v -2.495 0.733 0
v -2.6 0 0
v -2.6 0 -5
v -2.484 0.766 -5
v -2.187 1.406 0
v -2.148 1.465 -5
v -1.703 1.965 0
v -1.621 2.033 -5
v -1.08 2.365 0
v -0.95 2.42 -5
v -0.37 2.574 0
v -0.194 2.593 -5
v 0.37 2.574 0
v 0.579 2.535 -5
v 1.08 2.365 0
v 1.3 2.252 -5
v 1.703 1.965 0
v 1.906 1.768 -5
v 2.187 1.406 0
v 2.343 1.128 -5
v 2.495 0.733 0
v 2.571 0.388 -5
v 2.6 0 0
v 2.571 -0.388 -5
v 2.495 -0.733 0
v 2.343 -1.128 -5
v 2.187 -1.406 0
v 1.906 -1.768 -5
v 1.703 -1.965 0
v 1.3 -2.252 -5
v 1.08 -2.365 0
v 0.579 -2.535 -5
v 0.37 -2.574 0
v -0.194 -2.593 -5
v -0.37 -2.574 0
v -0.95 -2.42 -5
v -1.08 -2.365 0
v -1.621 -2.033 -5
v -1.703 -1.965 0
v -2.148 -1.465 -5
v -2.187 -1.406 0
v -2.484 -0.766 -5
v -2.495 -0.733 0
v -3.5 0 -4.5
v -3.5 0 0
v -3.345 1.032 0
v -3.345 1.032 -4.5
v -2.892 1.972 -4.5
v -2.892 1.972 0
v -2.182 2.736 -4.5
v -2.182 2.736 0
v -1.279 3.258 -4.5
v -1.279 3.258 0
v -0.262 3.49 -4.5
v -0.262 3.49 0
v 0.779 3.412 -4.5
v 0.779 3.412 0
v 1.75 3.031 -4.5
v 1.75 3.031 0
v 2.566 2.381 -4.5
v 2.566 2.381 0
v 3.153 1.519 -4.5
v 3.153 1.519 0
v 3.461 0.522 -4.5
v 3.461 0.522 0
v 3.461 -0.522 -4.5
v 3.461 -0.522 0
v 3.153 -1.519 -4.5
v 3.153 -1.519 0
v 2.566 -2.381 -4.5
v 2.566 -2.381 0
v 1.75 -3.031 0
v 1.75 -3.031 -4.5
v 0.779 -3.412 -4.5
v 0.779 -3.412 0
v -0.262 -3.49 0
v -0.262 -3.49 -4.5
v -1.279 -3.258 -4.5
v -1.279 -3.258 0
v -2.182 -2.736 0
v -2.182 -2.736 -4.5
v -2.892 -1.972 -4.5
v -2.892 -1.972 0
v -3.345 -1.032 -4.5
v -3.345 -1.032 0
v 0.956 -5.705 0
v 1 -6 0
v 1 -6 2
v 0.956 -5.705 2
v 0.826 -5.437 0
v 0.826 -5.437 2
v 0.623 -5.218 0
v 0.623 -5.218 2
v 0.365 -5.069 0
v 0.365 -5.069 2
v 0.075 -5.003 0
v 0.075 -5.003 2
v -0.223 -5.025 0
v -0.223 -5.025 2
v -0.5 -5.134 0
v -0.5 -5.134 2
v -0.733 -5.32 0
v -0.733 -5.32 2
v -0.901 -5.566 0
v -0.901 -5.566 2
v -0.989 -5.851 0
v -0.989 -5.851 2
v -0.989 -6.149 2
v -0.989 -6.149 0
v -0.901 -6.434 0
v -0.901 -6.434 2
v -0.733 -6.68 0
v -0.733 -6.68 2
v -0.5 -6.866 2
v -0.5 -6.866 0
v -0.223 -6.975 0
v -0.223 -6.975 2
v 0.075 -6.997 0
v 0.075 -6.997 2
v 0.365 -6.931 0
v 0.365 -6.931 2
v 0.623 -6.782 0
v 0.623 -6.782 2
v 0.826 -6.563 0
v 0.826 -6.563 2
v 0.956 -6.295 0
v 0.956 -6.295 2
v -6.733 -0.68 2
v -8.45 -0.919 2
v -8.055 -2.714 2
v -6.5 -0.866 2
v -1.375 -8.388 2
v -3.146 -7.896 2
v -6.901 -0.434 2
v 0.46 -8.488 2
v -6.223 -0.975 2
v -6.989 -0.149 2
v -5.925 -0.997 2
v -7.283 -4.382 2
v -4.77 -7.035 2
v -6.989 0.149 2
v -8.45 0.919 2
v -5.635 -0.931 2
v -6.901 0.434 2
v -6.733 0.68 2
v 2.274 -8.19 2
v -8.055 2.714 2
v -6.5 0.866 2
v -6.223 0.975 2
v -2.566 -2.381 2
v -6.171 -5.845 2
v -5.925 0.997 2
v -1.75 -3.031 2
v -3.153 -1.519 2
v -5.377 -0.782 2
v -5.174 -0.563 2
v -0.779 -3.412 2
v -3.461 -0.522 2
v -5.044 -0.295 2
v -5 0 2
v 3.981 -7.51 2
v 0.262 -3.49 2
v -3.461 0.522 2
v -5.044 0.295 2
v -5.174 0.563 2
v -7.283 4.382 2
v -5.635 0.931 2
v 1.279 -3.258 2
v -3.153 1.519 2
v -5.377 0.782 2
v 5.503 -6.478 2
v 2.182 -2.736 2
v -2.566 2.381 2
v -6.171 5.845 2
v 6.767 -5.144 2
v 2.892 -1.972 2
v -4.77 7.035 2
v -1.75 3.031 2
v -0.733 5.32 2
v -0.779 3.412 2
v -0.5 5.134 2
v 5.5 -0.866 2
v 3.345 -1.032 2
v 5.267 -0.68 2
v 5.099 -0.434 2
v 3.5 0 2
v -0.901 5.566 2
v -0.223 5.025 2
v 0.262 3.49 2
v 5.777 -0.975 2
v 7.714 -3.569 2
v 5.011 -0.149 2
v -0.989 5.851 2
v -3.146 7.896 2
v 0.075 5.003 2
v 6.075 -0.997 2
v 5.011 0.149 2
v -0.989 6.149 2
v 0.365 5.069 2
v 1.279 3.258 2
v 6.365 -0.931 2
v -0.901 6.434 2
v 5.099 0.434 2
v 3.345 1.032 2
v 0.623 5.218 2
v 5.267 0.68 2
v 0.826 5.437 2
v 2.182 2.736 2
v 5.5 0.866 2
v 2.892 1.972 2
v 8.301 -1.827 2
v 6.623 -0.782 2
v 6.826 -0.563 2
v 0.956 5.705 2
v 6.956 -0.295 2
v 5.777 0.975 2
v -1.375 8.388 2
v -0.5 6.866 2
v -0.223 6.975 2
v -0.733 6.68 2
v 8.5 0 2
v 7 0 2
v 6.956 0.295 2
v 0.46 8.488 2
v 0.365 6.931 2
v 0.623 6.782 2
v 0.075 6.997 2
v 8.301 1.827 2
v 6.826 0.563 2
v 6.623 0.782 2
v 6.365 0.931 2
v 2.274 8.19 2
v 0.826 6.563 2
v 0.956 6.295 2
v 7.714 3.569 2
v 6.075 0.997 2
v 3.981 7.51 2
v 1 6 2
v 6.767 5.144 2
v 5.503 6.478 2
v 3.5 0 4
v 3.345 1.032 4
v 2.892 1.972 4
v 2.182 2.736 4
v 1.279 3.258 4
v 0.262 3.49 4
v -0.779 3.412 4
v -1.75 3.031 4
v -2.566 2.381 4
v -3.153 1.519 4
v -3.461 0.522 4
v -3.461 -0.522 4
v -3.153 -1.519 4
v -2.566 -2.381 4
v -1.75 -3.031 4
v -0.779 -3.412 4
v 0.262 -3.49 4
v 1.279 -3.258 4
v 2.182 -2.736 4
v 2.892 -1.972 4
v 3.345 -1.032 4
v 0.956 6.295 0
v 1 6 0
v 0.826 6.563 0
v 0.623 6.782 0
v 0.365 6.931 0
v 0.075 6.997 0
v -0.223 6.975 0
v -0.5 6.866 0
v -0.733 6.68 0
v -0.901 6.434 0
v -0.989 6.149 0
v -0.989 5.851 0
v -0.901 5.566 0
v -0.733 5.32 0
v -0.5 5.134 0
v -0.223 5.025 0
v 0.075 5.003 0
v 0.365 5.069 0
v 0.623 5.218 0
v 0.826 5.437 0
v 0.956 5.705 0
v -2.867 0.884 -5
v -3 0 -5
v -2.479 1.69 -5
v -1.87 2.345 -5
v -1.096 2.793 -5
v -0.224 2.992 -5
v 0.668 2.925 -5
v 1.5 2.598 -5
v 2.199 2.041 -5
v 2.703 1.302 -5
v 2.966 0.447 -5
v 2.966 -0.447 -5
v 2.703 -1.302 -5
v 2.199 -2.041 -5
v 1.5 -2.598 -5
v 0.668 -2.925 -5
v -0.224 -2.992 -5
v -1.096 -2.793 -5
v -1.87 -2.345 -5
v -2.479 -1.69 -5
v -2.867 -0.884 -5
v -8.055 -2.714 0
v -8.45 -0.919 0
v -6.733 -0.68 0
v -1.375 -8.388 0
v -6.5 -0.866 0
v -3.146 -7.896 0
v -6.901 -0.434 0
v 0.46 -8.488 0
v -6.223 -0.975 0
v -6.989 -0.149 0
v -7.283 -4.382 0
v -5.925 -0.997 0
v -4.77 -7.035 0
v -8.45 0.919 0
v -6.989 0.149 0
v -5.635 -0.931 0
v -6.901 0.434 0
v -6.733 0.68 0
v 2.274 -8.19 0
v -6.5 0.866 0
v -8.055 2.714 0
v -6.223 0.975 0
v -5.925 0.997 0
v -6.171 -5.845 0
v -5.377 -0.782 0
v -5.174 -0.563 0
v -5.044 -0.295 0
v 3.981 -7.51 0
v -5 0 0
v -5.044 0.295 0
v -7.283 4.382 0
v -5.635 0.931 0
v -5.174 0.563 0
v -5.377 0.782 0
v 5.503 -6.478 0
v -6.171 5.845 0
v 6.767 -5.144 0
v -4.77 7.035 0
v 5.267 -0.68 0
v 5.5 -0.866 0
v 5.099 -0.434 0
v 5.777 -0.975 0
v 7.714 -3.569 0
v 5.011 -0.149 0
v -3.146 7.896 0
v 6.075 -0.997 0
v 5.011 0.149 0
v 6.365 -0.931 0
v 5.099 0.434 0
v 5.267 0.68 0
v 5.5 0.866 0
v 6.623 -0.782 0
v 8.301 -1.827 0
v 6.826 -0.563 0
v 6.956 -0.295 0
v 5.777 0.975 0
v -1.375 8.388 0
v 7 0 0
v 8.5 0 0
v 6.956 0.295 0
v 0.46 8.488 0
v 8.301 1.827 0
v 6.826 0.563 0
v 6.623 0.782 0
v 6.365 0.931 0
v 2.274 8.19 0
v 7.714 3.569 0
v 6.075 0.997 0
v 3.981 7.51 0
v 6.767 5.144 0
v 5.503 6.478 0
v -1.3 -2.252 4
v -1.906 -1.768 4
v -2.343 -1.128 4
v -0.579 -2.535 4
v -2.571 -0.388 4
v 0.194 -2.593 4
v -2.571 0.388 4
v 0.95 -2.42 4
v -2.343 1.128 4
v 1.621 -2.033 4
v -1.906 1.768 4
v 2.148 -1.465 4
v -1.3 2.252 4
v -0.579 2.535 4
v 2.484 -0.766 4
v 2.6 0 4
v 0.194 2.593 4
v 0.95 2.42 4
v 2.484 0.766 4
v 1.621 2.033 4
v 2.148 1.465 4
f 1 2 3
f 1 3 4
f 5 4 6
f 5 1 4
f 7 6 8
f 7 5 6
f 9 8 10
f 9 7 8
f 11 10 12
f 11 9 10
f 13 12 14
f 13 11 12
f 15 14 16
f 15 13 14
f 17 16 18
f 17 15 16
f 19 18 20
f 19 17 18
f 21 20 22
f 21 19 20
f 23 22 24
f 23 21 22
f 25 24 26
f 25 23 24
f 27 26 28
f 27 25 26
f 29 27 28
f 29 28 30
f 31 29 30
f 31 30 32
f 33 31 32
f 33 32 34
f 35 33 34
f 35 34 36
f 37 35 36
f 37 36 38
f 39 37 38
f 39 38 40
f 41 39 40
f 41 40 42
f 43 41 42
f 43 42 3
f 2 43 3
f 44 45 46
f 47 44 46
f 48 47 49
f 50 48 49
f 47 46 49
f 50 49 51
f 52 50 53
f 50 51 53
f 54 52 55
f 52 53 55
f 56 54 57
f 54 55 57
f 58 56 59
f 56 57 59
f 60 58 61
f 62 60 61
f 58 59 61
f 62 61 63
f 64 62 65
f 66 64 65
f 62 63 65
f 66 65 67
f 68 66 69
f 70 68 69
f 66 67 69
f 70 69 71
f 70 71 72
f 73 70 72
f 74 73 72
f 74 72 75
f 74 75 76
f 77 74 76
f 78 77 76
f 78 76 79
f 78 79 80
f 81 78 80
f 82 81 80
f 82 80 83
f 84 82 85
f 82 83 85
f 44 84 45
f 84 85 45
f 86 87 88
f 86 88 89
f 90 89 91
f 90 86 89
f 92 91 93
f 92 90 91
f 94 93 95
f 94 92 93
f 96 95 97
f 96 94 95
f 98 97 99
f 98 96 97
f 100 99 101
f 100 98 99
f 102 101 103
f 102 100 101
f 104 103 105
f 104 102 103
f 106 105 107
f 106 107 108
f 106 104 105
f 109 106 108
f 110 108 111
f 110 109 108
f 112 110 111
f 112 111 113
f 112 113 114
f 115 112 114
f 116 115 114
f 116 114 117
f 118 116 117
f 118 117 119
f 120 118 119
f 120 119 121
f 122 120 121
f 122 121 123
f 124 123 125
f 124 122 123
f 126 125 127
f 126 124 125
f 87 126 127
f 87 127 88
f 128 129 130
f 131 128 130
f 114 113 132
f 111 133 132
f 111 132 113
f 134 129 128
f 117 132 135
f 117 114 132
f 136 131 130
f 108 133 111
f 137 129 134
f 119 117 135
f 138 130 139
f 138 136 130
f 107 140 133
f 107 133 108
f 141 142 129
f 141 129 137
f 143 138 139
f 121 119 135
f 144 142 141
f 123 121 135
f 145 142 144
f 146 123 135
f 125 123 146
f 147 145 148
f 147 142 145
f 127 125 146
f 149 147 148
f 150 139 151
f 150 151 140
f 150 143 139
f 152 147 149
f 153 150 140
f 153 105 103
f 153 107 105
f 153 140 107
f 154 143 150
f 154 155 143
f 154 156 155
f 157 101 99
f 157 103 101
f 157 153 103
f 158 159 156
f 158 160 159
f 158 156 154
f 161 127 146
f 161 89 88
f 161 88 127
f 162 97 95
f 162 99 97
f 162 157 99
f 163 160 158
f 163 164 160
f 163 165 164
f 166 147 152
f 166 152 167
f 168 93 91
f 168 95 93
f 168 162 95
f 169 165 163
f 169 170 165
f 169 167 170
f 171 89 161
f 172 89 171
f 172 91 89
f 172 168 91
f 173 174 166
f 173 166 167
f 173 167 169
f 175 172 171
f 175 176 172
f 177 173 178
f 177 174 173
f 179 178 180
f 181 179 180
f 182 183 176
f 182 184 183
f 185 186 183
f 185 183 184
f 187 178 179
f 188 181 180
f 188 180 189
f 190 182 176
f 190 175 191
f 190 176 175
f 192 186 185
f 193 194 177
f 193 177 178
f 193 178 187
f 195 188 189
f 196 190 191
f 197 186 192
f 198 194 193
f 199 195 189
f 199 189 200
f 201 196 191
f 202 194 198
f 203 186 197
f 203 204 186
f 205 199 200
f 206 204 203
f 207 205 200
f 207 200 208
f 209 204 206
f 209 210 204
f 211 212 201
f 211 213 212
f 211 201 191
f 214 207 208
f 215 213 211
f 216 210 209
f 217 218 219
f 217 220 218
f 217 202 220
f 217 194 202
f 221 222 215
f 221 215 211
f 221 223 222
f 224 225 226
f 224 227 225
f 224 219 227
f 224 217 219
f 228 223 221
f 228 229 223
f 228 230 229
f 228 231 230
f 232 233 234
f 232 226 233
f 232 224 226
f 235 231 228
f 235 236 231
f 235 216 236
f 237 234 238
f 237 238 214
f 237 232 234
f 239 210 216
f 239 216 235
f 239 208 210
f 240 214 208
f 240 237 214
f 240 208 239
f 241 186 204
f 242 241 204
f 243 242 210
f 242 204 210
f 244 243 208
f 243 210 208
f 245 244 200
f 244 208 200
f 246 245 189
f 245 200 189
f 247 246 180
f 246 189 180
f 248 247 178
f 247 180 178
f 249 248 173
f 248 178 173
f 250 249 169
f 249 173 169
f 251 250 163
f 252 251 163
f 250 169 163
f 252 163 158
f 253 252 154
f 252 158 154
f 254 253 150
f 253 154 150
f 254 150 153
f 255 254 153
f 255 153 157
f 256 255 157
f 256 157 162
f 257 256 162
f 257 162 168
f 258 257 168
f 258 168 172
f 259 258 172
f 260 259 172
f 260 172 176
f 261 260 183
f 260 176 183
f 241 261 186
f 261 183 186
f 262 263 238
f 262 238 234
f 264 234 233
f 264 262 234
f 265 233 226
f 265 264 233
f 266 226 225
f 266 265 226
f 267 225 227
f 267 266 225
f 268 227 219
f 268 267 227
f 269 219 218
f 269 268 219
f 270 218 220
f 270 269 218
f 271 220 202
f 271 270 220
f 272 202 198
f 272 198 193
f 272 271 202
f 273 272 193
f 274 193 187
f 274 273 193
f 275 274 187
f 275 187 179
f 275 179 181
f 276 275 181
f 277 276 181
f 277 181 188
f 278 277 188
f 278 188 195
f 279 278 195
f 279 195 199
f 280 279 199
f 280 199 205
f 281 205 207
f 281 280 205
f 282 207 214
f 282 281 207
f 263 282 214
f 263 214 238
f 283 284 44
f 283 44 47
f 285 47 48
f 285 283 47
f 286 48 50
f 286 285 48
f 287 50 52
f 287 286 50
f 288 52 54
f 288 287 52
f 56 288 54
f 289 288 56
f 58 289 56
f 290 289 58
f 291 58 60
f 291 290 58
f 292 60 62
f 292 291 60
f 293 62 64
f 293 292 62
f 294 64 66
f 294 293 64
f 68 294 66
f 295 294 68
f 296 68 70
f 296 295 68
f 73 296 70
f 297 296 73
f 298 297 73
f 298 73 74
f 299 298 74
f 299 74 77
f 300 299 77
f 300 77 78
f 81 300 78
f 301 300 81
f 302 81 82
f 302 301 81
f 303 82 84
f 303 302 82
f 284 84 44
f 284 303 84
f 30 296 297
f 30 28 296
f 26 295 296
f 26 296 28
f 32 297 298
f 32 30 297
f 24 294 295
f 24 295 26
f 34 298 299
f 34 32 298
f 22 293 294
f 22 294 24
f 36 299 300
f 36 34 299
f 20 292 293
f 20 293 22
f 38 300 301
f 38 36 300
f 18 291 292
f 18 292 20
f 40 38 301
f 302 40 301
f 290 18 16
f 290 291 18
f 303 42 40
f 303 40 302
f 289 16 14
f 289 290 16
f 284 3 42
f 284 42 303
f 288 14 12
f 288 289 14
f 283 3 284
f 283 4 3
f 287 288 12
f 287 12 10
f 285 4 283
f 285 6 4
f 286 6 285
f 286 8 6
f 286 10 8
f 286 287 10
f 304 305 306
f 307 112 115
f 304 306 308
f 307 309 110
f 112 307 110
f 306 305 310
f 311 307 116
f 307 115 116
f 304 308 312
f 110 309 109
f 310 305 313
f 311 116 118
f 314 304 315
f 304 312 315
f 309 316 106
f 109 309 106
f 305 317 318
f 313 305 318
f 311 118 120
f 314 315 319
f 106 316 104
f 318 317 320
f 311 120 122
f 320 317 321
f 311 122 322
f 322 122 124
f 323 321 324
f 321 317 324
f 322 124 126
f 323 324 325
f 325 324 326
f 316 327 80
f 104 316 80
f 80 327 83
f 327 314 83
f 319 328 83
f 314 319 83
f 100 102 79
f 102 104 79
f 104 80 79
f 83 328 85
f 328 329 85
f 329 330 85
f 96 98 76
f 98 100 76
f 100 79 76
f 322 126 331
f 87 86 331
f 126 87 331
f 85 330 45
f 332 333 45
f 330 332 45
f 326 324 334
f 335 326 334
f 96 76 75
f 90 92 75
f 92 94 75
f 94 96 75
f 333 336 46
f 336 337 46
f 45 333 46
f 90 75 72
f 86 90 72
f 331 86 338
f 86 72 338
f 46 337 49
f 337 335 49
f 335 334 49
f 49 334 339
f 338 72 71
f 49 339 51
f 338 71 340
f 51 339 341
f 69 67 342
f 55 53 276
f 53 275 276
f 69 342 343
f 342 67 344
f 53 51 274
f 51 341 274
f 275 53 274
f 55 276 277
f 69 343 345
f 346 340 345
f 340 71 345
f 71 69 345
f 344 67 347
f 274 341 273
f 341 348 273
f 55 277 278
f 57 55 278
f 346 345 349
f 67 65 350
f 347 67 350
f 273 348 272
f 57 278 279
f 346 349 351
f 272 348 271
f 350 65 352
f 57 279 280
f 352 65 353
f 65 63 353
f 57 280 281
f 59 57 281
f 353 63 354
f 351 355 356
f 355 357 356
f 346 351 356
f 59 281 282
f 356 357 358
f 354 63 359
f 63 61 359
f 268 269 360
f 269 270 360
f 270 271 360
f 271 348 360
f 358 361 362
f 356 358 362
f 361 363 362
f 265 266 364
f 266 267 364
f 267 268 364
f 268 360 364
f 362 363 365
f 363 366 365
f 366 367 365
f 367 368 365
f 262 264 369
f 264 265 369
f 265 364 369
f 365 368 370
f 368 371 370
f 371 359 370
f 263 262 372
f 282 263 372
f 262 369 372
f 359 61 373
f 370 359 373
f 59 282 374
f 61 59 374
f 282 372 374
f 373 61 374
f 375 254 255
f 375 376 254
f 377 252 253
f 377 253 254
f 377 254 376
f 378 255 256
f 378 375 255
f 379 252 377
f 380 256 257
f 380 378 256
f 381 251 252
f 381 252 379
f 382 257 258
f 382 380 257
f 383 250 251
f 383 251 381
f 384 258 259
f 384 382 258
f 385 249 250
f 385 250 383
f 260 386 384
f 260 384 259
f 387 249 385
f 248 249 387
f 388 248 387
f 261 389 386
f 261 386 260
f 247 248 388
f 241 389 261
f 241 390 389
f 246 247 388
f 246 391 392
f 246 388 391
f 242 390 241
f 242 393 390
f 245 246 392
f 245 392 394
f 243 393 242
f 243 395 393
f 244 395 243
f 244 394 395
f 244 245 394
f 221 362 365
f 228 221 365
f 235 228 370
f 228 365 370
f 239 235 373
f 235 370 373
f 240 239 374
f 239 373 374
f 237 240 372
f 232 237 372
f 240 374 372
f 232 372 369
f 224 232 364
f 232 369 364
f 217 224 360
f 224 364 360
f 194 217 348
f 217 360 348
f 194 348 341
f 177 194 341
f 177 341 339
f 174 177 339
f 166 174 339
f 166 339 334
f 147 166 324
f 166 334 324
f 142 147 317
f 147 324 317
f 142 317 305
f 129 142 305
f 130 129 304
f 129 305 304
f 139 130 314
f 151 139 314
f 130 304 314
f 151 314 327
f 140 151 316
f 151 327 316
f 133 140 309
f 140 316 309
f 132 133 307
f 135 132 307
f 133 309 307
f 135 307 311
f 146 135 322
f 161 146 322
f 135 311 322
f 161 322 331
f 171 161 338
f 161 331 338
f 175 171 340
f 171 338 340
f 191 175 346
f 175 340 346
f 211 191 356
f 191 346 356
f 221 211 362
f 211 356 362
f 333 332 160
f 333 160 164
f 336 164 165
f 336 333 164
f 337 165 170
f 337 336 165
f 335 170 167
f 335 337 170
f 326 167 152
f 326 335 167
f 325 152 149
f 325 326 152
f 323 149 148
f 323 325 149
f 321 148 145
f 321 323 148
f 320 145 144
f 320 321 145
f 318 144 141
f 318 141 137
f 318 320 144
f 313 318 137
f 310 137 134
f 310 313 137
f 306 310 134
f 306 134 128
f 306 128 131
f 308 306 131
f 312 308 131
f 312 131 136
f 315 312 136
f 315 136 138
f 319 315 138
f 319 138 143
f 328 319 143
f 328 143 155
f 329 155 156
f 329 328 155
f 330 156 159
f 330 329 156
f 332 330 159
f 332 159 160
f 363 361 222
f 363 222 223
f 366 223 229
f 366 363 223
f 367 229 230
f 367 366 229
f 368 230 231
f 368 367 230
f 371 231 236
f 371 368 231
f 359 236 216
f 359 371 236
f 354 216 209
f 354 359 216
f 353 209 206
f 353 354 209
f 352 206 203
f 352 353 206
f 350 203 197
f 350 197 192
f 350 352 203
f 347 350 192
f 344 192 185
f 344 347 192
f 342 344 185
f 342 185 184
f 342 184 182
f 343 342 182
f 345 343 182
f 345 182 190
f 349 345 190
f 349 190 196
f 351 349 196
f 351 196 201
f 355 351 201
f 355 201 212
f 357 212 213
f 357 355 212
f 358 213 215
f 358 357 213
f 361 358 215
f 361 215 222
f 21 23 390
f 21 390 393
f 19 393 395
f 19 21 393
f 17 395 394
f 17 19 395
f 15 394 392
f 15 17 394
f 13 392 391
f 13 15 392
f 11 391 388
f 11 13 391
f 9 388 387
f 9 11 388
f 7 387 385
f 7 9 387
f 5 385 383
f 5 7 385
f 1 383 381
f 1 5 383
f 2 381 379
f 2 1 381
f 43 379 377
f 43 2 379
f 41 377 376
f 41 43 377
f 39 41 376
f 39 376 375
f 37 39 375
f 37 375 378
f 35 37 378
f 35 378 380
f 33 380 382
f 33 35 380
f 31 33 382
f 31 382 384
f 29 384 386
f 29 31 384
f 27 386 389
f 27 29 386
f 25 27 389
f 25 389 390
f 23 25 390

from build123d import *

# Parameters (mm, degrees)
SKETCH_2_R      = 8.5
SKETCH_2_R_2    = 2.6
SKETCH_2_R_3    = 1
EXTRUDE_1_DEPTH = 2
SKETCH_3_R      = 3.5
SKETCH_3_R_2    = 2.6
EXTRUDE_2_DEPTH = 2
SKETCH_4_R      = 3.5
SKETCH_4_R_2    = 2.6
EXTRUDE_3_DEPTH = 5
CHAMFER_1_SIZE  = 0.5


with BuildPart() as part:
    # Эскиз2 → Бобышка-Вытянуть1 (new body)
    with BuildSketch(Plane.XY):
        Circle(SKETCH_2_R)
        Circle(SKETCH_2_R_2, mode=Mode.SUBTRACT)
        with Locations((-6, 0)):
            Circle(SKETCH_2_R_3, mode=Mode.SUBTRACT)
        with Locations((0, 6)):
            Circle(SKETCH_2_R_3, mode=Mode.SUBTRACT)
        with Locations((6, 0)):
            Circle(SKETCH_2_R_3, mode=Mode.SUBTRACT)
        with Locations((0, -6)):
            Circle(SKETCH_2_R_3, mode=Mode.SUBTRACT)
    extrude(amount=EXTRUDE_1_DEPTH)

    # Эскиз3 → Бобышка-Вытянуть2 (add)
    with BuildSketch(Plane.XY.offset(2)):
        Circle(SKETCH_3_R)
        Circle(SKETCH_3_R_2, mode=Mode.SUBTRACT)
    extrude(amount=EXTRUDE_2_DEPTH)

    # Эскиз4 → Бобышка-Вытянуть3 (add)
    with BuildSketch(Plane(origin=(0, 0, 0), x_dir=(-1, 0, 0), z_dir=(0, 0, -1))):
        Circle(SKETCH_4_R)
        Circle(SKETCH_4_R_2, mode=Mode.SUBTRACT)
    extrude(amount=EXTRUDE_3_DEPTH)

    # Фаска1
    chamfer_1_edges = [part.edges().sort_by_distance(p)[0] for p in [
        (3.5, 0, -5),
    ]]
    chamfer(chamfer_1_edges, length=CHAMFER_1_SIZE)


solid = part.part
